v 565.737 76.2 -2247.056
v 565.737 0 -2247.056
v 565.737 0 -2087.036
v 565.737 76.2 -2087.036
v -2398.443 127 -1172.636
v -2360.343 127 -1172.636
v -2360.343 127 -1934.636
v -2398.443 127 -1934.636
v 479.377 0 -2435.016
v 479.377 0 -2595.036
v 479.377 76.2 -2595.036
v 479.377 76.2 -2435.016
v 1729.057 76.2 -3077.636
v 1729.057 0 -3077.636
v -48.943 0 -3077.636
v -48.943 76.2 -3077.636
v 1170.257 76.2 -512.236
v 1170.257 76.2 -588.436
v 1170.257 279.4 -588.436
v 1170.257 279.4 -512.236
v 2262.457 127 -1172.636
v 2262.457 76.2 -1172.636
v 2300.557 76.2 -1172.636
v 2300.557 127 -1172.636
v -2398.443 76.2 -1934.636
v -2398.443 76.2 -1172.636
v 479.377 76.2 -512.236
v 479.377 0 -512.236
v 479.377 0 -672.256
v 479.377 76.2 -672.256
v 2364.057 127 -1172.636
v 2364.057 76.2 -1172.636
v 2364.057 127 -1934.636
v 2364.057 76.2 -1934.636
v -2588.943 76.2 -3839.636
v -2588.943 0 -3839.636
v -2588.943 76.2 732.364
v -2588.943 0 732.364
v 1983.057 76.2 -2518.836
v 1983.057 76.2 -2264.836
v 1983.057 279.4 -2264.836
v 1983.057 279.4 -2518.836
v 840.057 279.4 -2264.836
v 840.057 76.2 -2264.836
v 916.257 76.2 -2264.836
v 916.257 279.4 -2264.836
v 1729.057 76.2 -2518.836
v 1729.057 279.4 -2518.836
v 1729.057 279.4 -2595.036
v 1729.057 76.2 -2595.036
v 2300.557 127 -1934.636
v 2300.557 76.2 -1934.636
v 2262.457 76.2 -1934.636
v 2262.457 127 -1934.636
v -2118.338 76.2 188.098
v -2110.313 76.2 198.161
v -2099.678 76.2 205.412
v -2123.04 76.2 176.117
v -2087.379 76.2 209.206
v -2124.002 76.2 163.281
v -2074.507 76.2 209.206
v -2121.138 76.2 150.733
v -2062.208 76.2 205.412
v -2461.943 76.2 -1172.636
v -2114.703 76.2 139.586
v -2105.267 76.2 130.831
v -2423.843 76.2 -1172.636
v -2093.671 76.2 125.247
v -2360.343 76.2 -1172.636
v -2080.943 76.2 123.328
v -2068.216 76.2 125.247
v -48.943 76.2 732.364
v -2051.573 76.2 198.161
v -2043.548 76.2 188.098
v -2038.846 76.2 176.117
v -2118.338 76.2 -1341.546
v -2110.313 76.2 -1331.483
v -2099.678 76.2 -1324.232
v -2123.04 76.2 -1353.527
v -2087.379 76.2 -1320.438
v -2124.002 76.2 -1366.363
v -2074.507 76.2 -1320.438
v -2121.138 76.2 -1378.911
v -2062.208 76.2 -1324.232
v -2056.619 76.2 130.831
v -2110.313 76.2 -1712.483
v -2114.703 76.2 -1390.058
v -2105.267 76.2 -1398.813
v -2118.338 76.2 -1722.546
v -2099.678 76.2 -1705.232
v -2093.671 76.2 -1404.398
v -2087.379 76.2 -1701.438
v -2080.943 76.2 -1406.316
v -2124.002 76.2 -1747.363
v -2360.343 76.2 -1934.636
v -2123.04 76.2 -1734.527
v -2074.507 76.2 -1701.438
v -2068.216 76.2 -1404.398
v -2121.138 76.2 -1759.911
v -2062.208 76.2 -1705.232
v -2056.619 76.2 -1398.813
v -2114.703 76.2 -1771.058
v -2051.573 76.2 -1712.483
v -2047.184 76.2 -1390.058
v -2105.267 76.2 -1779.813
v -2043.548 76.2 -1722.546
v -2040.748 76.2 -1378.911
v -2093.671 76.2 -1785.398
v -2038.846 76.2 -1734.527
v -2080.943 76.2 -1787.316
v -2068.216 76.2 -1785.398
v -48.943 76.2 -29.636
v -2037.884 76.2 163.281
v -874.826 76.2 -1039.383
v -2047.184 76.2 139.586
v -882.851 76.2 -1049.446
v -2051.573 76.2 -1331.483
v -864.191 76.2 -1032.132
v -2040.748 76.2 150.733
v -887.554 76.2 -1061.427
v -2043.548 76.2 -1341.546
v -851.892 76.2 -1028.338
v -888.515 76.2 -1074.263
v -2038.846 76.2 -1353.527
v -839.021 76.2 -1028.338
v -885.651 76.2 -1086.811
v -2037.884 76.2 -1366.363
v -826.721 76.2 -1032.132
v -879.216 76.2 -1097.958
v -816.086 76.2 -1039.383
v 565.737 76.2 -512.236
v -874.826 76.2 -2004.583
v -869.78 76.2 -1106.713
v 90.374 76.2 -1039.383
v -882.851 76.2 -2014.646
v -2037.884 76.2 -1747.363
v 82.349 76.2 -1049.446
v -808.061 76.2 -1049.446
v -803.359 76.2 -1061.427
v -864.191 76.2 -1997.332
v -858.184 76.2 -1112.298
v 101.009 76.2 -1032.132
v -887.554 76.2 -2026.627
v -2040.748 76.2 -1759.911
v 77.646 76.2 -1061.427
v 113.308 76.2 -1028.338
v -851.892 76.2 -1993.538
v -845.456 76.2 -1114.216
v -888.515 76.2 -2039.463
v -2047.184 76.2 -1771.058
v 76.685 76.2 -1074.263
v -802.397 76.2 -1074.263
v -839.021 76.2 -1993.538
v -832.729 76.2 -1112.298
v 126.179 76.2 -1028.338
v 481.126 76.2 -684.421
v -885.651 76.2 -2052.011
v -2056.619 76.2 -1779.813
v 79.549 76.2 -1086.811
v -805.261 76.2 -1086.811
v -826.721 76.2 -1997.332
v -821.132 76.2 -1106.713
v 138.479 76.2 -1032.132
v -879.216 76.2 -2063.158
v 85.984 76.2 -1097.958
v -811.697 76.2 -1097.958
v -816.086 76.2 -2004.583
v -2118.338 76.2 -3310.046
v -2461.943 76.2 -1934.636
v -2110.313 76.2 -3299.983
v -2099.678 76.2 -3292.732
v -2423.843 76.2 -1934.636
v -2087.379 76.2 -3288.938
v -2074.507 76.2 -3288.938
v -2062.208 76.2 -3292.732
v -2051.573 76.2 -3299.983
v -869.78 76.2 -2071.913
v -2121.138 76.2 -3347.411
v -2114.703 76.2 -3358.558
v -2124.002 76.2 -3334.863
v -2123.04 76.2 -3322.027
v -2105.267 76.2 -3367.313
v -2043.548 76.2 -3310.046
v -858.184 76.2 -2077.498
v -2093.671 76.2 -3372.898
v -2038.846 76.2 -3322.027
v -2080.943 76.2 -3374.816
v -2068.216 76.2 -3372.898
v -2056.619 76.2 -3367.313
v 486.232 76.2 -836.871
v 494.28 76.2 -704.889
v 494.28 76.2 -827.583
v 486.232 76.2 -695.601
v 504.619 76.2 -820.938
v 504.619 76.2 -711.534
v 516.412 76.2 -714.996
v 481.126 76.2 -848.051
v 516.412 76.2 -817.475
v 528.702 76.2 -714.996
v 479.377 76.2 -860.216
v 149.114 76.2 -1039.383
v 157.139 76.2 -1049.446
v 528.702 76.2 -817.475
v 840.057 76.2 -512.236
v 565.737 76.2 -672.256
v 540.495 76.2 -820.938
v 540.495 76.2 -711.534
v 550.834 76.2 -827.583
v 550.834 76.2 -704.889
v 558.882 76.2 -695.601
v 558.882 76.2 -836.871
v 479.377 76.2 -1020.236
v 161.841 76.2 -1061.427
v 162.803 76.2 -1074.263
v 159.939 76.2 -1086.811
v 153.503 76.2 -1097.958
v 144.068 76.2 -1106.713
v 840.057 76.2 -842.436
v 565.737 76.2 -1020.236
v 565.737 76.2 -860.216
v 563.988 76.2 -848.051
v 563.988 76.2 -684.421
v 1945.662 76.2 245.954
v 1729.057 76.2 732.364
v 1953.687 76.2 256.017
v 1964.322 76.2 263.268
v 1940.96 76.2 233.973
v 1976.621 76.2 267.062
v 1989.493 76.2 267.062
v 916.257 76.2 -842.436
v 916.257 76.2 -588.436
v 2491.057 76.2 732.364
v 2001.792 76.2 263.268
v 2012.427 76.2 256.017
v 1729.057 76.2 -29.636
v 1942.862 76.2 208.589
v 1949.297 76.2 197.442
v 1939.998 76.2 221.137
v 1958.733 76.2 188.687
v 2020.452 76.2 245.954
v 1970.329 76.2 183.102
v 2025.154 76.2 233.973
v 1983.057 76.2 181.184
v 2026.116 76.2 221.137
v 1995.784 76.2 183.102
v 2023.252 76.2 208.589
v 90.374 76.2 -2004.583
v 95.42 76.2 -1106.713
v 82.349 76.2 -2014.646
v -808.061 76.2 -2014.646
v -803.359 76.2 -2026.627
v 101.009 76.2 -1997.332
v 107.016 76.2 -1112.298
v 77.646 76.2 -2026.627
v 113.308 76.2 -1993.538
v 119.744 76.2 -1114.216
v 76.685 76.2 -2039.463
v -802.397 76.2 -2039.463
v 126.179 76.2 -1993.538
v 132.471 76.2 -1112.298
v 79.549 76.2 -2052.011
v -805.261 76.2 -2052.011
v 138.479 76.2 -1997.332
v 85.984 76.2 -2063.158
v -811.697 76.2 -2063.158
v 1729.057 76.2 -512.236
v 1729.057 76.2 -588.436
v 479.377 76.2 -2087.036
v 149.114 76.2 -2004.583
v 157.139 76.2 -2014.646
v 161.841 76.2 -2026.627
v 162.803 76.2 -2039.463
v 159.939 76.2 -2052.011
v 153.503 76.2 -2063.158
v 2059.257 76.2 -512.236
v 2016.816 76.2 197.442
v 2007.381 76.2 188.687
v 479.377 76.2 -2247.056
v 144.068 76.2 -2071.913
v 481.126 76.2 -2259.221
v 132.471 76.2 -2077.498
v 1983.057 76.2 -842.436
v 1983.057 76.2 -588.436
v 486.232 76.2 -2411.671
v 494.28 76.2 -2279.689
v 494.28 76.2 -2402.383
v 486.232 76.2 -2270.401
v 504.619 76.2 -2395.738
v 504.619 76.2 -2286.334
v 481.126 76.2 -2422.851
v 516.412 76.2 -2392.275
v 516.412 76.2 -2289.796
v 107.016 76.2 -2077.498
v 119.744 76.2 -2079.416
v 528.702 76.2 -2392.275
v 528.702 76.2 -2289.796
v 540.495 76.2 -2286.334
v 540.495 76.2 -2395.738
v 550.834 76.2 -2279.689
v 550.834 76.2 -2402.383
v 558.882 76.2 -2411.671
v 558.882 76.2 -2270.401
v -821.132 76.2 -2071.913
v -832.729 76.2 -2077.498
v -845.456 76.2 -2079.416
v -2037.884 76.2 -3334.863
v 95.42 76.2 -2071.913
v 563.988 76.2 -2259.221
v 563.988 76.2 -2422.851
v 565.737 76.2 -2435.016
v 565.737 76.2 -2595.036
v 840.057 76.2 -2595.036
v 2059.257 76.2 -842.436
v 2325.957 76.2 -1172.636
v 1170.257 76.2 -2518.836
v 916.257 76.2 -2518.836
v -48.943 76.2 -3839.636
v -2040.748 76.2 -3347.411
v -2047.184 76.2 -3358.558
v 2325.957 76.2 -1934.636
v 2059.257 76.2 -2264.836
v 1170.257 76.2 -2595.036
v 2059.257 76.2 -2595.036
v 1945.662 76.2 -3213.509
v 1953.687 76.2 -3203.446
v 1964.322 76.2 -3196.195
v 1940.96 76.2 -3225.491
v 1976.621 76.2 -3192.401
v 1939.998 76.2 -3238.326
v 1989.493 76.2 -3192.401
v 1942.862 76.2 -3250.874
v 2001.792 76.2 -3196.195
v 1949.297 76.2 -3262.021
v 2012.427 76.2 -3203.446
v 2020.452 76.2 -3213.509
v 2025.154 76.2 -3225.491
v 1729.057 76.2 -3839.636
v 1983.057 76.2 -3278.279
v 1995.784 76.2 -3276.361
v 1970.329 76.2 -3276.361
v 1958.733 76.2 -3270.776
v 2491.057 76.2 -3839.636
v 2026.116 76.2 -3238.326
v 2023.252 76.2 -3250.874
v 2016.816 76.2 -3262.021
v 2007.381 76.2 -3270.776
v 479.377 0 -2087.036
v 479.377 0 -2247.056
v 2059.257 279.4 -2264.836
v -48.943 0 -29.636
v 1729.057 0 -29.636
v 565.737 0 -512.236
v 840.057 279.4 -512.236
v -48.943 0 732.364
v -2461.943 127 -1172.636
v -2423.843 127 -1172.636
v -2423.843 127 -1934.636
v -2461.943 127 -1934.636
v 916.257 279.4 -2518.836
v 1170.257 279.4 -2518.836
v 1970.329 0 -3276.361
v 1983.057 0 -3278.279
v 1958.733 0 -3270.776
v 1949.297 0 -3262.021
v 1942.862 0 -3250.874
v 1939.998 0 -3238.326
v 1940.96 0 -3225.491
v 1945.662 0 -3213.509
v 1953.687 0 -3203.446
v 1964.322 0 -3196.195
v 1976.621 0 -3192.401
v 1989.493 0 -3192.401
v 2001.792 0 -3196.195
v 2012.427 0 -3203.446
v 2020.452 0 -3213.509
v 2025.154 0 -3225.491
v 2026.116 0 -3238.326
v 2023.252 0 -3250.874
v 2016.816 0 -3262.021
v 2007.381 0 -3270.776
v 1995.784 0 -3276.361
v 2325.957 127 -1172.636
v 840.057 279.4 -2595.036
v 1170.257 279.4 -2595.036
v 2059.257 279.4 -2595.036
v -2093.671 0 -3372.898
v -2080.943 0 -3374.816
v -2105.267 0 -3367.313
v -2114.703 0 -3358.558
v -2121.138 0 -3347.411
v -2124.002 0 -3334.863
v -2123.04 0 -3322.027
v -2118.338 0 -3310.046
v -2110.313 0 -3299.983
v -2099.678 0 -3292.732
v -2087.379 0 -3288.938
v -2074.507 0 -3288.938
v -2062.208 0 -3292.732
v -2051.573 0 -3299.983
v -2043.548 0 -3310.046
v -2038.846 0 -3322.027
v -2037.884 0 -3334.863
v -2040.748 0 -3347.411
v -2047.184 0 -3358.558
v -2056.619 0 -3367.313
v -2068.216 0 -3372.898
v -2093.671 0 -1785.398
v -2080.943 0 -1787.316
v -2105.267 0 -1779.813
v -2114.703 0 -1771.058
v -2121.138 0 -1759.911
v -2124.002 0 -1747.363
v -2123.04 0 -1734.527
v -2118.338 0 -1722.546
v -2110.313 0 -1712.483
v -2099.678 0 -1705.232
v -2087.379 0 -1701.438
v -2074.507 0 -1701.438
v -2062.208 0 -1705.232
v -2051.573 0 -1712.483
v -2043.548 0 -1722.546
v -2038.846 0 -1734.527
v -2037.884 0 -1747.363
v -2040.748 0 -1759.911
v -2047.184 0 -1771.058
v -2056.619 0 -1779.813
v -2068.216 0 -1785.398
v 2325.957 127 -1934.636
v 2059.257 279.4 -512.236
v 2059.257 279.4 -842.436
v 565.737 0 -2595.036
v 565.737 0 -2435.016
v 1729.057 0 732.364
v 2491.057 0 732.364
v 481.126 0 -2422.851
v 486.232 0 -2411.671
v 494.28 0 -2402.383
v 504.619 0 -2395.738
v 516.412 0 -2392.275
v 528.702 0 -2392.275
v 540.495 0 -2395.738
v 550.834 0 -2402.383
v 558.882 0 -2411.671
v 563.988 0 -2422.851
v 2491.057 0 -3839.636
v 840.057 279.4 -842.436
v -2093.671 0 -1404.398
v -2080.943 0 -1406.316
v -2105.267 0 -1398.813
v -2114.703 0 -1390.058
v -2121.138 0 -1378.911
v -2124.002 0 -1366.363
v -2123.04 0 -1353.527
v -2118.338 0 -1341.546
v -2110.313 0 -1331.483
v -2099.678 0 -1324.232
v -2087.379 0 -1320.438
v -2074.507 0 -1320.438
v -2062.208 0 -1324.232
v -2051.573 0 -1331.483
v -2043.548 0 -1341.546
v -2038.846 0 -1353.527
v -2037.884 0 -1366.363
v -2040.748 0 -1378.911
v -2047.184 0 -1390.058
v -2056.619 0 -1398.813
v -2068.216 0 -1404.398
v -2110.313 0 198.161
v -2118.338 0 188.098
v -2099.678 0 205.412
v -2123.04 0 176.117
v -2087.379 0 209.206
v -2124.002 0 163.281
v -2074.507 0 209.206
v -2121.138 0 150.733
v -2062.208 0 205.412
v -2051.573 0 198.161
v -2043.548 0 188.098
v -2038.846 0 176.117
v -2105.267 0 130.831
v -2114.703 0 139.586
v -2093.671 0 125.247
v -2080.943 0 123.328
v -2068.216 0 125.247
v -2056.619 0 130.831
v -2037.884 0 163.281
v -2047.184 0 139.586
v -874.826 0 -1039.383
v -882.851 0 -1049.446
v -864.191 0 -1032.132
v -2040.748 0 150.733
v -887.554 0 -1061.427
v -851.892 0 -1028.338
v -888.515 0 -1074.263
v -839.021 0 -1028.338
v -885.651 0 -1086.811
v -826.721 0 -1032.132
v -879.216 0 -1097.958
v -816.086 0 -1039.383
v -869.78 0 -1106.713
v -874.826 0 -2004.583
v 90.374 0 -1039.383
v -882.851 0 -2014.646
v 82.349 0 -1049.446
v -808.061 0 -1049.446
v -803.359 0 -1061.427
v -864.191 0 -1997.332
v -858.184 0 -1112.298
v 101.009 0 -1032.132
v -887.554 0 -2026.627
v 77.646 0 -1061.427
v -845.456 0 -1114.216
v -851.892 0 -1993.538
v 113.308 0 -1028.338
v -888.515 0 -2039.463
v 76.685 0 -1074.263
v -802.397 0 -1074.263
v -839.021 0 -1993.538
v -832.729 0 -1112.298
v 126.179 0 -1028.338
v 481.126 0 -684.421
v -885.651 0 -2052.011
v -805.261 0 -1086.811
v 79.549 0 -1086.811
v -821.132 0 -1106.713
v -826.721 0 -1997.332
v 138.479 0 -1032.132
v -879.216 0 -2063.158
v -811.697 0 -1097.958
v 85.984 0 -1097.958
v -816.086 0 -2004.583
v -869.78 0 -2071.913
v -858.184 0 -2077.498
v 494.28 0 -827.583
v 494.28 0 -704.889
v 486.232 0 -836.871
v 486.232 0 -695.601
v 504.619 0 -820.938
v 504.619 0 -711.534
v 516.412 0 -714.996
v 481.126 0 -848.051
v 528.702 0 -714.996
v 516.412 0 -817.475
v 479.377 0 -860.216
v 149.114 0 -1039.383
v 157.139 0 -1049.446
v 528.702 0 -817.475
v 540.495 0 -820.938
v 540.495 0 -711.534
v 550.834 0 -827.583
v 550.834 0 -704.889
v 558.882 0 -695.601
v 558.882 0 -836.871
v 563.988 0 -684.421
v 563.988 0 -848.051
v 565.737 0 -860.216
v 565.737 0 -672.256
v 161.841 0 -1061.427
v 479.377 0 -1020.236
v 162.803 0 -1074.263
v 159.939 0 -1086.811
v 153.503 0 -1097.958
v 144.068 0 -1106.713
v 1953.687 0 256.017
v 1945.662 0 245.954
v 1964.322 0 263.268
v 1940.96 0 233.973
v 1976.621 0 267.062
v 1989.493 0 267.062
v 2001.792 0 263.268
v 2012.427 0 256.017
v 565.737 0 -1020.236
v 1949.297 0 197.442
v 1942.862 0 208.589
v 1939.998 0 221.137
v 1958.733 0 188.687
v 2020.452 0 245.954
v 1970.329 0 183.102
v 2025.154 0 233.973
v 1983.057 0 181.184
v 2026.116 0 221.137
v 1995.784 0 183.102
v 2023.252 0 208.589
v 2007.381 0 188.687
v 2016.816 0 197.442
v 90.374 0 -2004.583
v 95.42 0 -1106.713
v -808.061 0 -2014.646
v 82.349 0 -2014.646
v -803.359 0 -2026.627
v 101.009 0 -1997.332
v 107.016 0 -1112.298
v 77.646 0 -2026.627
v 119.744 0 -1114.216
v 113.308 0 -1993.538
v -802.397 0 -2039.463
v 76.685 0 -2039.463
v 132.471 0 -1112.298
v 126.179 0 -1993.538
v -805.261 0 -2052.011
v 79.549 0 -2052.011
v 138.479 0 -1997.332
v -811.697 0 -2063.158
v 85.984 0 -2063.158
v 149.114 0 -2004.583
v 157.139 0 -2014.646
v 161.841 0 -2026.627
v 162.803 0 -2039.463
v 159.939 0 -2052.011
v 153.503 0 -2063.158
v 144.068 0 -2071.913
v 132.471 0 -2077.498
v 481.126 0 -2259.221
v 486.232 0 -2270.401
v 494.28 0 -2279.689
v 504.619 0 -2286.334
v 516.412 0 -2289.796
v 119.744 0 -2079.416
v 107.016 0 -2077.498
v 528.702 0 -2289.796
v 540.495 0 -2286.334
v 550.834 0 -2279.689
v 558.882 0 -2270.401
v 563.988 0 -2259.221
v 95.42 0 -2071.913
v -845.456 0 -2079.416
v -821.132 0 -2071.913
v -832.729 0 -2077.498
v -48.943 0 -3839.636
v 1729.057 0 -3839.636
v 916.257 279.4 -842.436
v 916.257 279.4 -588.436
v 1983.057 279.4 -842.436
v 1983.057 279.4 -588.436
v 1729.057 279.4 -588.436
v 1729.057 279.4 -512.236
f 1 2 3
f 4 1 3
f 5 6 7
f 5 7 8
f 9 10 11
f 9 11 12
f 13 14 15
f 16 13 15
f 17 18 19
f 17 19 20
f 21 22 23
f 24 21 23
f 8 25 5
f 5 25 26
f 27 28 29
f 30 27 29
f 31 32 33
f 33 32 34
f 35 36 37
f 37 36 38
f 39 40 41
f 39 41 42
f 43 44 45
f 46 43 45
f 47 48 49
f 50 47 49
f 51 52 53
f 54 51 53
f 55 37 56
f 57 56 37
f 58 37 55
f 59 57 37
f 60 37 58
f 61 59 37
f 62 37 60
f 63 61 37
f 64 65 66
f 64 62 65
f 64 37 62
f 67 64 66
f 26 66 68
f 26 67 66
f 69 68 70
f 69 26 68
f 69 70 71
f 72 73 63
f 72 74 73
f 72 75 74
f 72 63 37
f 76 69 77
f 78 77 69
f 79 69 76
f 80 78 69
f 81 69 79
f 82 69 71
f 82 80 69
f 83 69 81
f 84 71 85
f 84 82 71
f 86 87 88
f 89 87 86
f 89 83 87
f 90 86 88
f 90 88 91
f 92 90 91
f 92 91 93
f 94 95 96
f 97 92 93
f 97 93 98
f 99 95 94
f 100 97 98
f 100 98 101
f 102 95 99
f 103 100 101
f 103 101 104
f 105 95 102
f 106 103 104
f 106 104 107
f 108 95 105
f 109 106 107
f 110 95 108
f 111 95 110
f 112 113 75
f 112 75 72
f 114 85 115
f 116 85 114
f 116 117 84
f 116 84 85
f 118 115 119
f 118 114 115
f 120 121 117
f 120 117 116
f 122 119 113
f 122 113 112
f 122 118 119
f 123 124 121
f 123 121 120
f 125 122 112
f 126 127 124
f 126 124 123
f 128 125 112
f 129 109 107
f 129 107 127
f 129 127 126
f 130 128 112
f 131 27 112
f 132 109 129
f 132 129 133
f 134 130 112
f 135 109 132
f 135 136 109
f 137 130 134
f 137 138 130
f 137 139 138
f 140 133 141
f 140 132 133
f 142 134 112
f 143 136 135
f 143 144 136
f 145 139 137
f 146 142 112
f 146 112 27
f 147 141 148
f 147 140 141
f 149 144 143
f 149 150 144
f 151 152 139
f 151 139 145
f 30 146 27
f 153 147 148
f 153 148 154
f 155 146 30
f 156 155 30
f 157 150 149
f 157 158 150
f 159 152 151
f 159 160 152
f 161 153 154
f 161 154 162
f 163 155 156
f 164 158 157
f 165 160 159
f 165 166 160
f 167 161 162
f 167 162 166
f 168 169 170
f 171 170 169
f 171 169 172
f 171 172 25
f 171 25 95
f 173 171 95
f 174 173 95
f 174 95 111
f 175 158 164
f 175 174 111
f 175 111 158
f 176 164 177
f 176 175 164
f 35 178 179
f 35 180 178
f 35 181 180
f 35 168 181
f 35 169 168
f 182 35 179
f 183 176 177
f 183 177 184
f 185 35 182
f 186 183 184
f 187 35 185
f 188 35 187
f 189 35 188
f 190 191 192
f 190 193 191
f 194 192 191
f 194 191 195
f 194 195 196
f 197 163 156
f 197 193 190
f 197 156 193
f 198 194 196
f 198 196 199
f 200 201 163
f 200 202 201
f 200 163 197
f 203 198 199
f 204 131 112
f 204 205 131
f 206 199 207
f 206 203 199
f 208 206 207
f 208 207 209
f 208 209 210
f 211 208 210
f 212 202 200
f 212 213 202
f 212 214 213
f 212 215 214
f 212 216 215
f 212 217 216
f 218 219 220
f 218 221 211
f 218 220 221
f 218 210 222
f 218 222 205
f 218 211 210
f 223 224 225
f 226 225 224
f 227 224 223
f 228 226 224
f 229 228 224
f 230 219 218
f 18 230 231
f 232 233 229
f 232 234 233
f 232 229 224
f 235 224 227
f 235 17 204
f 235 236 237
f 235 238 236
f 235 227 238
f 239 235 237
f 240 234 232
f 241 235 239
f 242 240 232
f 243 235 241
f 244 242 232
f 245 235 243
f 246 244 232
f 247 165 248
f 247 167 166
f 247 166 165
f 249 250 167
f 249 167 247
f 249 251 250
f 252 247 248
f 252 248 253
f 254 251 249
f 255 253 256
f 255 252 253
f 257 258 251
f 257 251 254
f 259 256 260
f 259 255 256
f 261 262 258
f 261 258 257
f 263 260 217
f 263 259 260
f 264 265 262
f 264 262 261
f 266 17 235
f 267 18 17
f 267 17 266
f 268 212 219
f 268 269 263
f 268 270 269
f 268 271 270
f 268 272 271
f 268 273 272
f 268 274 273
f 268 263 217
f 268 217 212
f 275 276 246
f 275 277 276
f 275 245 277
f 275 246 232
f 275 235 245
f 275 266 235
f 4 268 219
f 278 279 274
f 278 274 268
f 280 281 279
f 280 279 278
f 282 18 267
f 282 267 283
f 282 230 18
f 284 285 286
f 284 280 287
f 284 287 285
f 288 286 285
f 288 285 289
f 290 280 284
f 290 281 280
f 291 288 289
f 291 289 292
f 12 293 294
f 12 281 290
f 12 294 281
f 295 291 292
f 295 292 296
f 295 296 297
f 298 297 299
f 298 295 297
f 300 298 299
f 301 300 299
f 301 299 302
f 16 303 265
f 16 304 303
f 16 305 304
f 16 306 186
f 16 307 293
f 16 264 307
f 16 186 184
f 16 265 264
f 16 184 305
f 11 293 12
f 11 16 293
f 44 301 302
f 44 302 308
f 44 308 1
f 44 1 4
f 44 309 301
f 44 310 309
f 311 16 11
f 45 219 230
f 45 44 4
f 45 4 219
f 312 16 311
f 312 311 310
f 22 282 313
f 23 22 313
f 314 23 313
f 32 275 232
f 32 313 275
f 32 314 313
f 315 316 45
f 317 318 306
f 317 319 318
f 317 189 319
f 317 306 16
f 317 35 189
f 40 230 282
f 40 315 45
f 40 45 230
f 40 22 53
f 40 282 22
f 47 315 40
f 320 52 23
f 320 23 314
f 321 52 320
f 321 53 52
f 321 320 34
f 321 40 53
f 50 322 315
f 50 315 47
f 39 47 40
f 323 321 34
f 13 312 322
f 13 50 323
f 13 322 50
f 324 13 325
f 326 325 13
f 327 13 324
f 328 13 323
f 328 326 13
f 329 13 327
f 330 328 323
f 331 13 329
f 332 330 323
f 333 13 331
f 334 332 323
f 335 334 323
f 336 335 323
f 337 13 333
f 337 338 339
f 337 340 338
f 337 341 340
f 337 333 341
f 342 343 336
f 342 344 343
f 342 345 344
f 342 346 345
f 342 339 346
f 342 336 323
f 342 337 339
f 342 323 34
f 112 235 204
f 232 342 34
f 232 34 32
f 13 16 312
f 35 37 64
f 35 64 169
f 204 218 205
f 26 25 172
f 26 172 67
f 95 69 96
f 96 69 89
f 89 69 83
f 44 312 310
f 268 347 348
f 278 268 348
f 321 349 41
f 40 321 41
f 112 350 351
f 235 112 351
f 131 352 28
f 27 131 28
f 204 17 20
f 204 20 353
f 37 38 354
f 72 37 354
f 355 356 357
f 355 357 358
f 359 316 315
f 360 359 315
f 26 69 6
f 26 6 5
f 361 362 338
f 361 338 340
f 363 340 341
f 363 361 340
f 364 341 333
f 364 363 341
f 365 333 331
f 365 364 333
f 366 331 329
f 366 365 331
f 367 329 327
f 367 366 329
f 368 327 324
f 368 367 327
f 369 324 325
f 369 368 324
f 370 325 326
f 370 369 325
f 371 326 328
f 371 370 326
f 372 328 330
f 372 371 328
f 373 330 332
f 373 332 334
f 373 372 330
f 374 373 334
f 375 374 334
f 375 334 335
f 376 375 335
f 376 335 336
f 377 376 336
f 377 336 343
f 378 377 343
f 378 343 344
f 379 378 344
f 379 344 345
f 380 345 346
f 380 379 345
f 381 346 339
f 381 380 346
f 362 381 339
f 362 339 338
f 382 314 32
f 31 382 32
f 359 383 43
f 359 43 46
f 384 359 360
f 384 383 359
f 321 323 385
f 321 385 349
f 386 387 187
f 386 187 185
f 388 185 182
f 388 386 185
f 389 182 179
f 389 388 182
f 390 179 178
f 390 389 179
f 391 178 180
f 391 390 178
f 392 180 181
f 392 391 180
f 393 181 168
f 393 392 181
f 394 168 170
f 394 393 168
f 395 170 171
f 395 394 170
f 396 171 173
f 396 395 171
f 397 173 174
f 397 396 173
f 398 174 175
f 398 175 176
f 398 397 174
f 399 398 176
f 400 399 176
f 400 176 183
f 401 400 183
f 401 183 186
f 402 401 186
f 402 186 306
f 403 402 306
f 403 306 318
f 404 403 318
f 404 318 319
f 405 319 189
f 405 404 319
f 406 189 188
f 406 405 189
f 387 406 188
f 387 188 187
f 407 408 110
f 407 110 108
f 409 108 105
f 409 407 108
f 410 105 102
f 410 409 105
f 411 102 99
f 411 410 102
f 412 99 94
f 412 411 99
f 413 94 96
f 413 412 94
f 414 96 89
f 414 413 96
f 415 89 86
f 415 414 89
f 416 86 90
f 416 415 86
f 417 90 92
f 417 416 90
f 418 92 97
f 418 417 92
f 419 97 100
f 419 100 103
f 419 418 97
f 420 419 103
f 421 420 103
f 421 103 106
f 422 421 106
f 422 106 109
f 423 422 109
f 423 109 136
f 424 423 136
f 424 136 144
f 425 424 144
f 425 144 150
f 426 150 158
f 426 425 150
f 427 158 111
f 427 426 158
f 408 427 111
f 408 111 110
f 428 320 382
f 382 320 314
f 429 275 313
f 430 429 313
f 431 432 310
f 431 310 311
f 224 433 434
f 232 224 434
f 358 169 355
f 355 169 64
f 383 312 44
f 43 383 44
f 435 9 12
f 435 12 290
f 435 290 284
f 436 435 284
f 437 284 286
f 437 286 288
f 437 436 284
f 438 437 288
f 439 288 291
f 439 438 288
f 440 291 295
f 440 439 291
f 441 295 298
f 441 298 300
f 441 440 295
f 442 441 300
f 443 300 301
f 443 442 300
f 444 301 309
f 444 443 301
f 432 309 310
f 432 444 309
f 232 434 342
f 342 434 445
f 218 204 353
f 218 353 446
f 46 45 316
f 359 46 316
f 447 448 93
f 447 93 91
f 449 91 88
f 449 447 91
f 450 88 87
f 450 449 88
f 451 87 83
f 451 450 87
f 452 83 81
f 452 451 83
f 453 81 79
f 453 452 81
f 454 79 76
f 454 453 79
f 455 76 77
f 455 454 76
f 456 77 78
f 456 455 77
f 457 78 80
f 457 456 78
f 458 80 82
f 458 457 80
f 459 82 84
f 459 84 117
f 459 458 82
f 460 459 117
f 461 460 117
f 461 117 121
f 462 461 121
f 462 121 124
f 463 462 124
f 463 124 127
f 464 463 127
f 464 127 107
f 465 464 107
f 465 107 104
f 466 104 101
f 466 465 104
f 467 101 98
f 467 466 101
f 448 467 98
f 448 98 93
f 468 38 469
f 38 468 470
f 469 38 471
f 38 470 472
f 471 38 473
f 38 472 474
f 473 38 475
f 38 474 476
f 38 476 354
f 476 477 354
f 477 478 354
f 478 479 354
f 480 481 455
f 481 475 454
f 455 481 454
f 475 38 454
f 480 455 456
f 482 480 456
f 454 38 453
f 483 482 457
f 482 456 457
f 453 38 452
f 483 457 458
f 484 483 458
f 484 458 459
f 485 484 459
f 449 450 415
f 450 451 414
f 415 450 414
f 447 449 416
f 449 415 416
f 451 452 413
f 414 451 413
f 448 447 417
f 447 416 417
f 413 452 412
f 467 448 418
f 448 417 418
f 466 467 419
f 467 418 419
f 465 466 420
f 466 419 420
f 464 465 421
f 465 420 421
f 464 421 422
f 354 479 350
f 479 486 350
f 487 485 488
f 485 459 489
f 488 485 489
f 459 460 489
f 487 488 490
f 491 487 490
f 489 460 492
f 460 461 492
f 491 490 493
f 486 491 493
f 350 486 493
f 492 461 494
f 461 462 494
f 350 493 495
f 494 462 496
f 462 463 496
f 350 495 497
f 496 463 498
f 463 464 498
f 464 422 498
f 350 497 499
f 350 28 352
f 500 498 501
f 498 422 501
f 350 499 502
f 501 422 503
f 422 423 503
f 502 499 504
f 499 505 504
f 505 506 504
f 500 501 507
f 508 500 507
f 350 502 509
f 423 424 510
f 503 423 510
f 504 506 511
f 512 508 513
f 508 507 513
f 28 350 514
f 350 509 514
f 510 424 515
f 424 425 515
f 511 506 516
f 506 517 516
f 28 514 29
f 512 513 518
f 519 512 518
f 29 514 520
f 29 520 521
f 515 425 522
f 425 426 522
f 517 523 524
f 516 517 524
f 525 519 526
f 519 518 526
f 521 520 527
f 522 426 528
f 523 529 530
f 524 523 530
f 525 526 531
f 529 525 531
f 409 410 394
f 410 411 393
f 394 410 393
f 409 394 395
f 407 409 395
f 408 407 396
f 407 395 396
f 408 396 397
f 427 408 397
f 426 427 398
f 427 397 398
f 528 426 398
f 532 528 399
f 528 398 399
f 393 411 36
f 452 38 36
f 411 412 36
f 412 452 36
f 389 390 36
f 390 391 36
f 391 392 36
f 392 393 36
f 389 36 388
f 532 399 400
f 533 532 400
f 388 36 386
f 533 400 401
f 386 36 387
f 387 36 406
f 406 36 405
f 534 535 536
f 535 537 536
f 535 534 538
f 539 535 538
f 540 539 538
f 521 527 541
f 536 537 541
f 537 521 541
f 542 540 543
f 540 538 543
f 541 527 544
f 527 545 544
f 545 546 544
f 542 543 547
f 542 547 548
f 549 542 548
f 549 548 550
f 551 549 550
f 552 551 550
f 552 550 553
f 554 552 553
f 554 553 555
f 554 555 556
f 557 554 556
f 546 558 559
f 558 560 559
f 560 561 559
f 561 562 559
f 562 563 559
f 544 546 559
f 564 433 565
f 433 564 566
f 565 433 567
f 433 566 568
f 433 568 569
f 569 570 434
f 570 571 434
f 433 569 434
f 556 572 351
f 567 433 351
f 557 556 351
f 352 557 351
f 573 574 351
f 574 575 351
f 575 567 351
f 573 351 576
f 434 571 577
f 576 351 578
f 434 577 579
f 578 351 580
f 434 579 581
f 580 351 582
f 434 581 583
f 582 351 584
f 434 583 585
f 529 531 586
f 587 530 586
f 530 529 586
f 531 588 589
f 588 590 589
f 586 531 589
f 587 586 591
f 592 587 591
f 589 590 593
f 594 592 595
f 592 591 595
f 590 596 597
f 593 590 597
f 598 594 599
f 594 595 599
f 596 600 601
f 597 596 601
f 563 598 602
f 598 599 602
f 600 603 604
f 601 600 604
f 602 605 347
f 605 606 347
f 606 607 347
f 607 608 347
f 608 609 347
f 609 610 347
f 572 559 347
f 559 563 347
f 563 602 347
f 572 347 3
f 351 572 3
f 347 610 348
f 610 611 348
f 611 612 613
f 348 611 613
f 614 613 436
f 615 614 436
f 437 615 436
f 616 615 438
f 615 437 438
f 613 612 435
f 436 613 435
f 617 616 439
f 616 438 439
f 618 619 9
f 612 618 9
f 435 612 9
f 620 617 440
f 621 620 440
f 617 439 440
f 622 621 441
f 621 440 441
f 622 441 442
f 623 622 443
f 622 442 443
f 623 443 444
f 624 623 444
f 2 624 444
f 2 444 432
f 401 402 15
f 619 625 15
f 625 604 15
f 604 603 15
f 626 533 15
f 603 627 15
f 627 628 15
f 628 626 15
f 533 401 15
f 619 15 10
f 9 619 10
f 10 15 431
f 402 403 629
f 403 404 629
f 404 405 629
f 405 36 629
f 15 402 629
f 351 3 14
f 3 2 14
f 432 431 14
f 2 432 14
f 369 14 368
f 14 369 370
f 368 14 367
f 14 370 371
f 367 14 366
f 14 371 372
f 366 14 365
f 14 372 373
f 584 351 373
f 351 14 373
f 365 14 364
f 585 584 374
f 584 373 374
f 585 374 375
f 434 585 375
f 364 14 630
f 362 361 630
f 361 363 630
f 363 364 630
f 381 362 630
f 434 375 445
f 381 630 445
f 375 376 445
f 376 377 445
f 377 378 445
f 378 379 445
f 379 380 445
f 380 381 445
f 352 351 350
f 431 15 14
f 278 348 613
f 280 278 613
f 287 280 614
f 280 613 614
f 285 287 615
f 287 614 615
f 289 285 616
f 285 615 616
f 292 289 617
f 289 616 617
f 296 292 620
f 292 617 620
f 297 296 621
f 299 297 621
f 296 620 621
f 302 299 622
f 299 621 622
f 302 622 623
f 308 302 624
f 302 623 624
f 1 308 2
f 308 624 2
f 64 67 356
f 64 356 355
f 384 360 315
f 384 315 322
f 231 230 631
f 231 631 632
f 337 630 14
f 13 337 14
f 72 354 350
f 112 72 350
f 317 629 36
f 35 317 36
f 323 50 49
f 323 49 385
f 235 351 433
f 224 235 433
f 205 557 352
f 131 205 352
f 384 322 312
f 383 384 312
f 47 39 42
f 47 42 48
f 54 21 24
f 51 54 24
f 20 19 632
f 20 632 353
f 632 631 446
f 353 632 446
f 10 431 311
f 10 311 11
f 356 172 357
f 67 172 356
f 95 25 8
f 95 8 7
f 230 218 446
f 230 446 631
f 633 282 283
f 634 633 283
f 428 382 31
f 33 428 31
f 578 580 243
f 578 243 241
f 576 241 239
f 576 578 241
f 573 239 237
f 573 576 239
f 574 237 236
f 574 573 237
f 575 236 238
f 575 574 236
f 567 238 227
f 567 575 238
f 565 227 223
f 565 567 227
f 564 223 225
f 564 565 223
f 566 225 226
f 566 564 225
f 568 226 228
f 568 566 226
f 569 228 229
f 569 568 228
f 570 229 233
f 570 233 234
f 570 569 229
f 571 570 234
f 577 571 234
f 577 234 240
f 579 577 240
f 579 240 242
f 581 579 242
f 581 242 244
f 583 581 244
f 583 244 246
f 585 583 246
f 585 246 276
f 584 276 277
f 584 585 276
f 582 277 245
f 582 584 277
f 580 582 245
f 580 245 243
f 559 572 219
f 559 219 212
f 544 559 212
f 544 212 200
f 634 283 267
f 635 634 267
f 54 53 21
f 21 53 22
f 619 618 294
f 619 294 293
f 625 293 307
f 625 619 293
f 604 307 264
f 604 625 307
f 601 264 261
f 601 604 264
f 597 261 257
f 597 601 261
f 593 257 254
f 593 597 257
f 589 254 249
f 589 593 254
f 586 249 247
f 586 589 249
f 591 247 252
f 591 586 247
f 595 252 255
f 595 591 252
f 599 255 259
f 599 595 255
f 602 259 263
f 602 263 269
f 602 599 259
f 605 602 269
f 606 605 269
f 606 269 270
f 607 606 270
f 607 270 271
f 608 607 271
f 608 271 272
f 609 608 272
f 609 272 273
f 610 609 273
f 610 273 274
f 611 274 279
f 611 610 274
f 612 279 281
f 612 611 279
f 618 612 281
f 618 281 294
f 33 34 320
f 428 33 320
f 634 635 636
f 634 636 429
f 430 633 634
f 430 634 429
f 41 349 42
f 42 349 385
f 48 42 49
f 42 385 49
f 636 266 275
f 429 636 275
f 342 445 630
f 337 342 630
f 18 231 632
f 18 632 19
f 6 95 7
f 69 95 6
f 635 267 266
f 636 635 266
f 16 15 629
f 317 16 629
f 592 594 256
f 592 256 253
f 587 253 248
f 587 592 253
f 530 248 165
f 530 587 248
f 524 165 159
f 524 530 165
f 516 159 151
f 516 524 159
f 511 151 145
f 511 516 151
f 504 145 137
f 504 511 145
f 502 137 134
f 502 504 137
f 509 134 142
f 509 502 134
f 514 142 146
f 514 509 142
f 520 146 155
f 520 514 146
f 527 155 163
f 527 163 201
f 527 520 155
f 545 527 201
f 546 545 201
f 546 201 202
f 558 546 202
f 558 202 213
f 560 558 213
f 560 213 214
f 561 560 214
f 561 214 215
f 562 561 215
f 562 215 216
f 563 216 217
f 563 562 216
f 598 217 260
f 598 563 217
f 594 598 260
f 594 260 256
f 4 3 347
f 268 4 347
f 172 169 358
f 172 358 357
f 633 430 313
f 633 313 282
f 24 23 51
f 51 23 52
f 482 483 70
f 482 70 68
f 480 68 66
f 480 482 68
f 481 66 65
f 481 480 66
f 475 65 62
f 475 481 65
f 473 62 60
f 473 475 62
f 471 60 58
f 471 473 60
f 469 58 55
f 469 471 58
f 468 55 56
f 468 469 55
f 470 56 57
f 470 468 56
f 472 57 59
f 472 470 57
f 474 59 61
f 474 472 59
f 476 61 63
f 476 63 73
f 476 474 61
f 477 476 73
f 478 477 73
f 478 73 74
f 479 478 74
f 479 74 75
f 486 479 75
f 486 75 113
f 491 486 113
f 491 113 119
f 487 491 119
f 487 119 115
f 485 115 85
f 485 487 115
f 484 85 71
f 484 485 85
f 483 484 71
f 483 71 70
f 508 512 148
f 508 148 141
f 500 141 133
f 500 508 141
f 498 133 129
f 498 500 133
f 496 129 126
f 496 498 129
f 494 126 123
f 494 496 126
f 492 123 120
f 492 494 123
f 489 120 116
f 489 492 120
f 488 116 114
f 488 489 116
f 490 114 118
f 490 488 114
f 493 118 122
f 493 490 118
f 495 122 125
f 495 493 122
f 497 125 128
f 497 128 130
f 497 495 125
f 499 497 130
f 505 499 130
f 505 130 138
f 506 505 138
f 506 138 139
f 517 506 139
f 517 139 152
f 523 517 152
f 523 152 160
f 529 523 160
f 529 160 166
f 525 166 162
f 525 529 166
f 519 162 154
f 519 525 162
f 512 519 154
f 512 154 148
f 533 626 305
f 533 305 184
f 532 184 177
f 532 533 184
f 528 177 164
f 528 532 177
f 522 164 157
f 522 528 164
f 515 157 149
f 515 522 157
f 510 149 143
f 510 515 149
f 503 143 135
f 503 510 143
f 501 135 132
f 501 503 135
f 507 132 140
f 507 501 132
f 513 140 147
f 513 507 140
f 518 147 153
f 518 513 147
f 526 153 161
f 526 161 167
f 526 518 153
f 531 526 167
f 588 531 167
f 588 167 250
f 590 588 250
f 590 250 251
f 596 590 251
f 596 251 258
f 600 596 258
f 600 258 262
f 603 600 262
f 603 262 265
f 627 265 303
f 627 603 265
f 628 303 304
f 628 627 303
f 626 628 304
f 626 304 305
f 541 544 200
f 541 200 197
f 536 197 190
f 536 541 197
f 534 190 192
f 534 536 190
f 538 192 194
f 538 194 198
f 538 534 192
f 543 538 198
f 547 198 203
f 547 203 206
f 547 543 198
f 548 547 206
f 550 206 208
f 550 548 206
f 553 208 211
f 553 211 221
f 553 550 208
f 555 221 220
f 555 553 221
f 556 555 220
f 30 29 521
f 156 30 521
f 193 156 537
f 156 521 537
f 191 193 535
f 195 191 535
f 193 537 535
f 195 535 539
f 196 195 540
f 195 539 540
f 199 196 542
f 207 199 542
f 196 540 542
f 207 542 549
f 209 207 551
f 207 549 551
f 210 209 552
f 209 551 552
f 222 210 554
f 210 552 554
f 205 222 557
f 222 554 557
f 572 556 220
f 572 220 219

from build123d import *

# Parameters (mm, degrees)
SKETCH1_R           = 43.18
BOSS_EXTRUDE1_DEPTH = 76.2
BOSS_EXTRUDE4_DEPTH = 203.2
BOSS_EXTRUDE8_DEPTH = 50.8


with BuildPart() as part:
    # Sketch1 → Boss-Extrude1 (new body)
    with BuildSketch(Plane(origin=(0, 0, 0), x_dir=(1, 0, 0), z_dir=(0, 1, 0))):
        Polygon((-48.943073508, 29.635887653), (1729.056926492, 29.635887653), (1729.056926492, -732.364112347), (2491.056926492, -732.364112347), (2491.056926492, 3839.635887653), (1729.056926492, 3839.635887653), (1729.056926492, 3077.635887653), (-48.943073508, 3077.635887653), (-48.943073508, 3839.635887653), (-2588.943073508, 3839.635887653), (-2588.943073508, -732.364112347), (-48.943073508, -732.364112347), align=None)
        with Locations(Location((-2080.943073508, -166.508163088, 0), (0, 0, 90))):
            Circle(SKETCH1_R, mode=Mode.SUBTRACT)
        with Locations(Location((-2080.943073508, 1744.135887653, 0), (0, 0, 90))):
            Circle(SKETCH1_R, mode=Mode.SUBTRACT)
        with Locations(Location((-2080.943073508, 1363.135887653, 0), (0, 0, 90))):
            Circle(SKETCH1_R, mode=Mode.SUBTRACT)
        with Locations(Location((-2080.943073508, 3331.635887653, 0), (0, 0, 90))):
            Circle(SKETCH1_R, mode=Mode.SUBTRACT)
        with Locations(Location((1983.056926492, -224.364112347, 0), (0, 0, 90))):
            Circle(SKETCH1_R, mode=Mode.SUBTRACT)
        with Locations(Location((1983.056926492, 3235.099053778, 0), (0, 0, 90))):
            Circle(SKETCH1_R, mode=Mode.SUBTRACT)
        with Locations(Location((-845.456188569, 1071.035887653, 0), (0, 0, 90))):
            Circle(SKETCH1_R, mode=Mode.SUBTRACT)
        with Locations(Location((119.743811431, 1071.035887653, 0), (0, 0, 90))):
            Circle(SKETCH1_R, mode=Mode.SUBTRACT)
        with Locations(Location((119.743811431, 2036.235887653, 0), (0, 0, 90))):
            Circle(SKETCH1_R, mode=Mode.SUBTRACT)
        with Locations(Location((-845.456188569, 2036.235887653, 0), (0, 0, 90))):
            Circle(SKETCH1_R, mode=Mode.SUBTRACT)
        with BuildLine():
            Line((565.736926492, 2435.015887653), (565.736926492, 2595.035887653))
            Line((565.736926492, 2595.035887653), (479.376926492, 2595.035887653))
            Line((479.376926492, 2595.035887653), (479.376926492, 2435.015887653))
            ThreePointArc((479.376926492, 2435.015887653), (522.556926492, 2391.835887653), (565.736926492, 2435.015887653))
        make_face(mode=Mode.SUBTRACT)
        with BuildLine():
            Line((565.736926492, 2247.055887653), (565.736926492, 2087.035887653))
            Line((565.736926492, 2087.035887653), (479.376926492, 2087.035887653))
            Line((479.376926492, 2087.035887653), (479.376926492, 2247.055887653))
            ThreePointArc((479.376926492, 2247.055887653), (522.556926492, 2290.235887653), (565.736926492, 2247.055887653))
        make_face(mode=Mode.SUBTRACT)
        with BuildLine():
            Line((479.376926492, 1020.235887653), (479.376926492, 860.215887653))
            ThreePointArc((479.376926492, 860.215887653), (522.556926492, 817.035887653), (565.736926492, 860.215887653))
            Line((565.736926492, 860.215887653), (565.736926492, 1020.235887653))
            Line((565.736926492, 1020.235887653), (479.376926492, 1020.235887653))
        make_face(mode=Mode.SUBTRACT)
        with BuildLine():
            Line((479.376926492, 512.235887653), (479.376926492, 672.255887653))
            ThreePointArc((479.376926492, 672.255887653), (522.556926492, 715.435887653), (565.736926492, 672.255887653))
            Line((565.736926492, 672.255887653), (565.736926492, 512.235887653))
            Line((565.736926492, 512.235887653), (479.376926492, 512.235887653))
        make_face(mode=Mode.SUBTRACT)
    extrude(amount=BOSS_EXTRUDE1_DEPTH)

    # Sketch2 → Boss-Extrude4 (add)
    with BuildSketch(Plane(origin=(0, 76.2, 0), x_dir=(1, 0, 0), z_dir=(0, 1, 0))):
        Polygon((2059.256926492, 512.235887653), (2059.256926492, 842.435887653), (1983.056926492, 842.435887653), (1983.056926492, 588.435887653), (1729.056926492, 588.435887653), (1729.056926492, 512.235887653), align=None)
        Polygon((840.056926492, 842.435887653), (916.256926492, 842.435887653), (916.256926492, 588.435887653), (1170.256926492, 588.435887653), (1170.256926492, 512.235887653), (840.056926492, 512.235887653), align=None)
        Polygon((840.056926492, 2595.035887653), (840.056926492, 2264.835887653), (916.256926492, 2264.835887653), (916.256926492, 2518.835887653), (1170.256926492, 2518.835887653), (1170.256926492, 2595.035887653), align=None)
        Polygon((2059.256926492, 2264.835887653), (1983.056926492, 2264.835887653), (1983.056926492, 2518.835887653), (1729.056926492, 2518.835887653), (1729.056926492, 2595.035887653), (2059.256926492, 2595.035887653), align=None)
    extrude(amount=BOSS_EXTRUDE4_DEPTH)

    # Sketch5 → Boss-Extrude8 (add)
    with BuildSketch(Plane(origin=(0, 76.2, 0), x_dir=(1, 0, 0), z_dir=(0, 1, 0))):
        Polygon((2300.556926492, 1172.635887653), (2300.556926492, 1553.635887653), (2300.556926492, 1934.635887653), (2262.456926492, 1934.635887653), (2262.456926492, 1172.635887653), align=None)
        Polygon((-2461.943073508, 1553.635887653), (-2461.943073508, 1934.635887653), (-2423.843073508, 1934.635887653), (-2423.843073508, 1172.635887653), (-2461.943073508, 1172.635887653), align=None)
        Polygon((-2398.443073508, 1553.635887653), (-2398.443073508, 1934.635887653), (-2360.343073508, 1934.635887653), (-2360.343073508, 1172.635887653), (-2398.443073508, 1172.635887653), align=None)
        Polygon((2364.056926492, 1172.635887653), (2364.056926492, 1553.635887653), (2364.056926492, 1934.635887653), (2325.956926492, 1934.635887653), (2325.956926492, 1172.635887653), align=None)
    extrude(amount=BOSS_EXTRUDE8_DEPTH)


solid = part.part
